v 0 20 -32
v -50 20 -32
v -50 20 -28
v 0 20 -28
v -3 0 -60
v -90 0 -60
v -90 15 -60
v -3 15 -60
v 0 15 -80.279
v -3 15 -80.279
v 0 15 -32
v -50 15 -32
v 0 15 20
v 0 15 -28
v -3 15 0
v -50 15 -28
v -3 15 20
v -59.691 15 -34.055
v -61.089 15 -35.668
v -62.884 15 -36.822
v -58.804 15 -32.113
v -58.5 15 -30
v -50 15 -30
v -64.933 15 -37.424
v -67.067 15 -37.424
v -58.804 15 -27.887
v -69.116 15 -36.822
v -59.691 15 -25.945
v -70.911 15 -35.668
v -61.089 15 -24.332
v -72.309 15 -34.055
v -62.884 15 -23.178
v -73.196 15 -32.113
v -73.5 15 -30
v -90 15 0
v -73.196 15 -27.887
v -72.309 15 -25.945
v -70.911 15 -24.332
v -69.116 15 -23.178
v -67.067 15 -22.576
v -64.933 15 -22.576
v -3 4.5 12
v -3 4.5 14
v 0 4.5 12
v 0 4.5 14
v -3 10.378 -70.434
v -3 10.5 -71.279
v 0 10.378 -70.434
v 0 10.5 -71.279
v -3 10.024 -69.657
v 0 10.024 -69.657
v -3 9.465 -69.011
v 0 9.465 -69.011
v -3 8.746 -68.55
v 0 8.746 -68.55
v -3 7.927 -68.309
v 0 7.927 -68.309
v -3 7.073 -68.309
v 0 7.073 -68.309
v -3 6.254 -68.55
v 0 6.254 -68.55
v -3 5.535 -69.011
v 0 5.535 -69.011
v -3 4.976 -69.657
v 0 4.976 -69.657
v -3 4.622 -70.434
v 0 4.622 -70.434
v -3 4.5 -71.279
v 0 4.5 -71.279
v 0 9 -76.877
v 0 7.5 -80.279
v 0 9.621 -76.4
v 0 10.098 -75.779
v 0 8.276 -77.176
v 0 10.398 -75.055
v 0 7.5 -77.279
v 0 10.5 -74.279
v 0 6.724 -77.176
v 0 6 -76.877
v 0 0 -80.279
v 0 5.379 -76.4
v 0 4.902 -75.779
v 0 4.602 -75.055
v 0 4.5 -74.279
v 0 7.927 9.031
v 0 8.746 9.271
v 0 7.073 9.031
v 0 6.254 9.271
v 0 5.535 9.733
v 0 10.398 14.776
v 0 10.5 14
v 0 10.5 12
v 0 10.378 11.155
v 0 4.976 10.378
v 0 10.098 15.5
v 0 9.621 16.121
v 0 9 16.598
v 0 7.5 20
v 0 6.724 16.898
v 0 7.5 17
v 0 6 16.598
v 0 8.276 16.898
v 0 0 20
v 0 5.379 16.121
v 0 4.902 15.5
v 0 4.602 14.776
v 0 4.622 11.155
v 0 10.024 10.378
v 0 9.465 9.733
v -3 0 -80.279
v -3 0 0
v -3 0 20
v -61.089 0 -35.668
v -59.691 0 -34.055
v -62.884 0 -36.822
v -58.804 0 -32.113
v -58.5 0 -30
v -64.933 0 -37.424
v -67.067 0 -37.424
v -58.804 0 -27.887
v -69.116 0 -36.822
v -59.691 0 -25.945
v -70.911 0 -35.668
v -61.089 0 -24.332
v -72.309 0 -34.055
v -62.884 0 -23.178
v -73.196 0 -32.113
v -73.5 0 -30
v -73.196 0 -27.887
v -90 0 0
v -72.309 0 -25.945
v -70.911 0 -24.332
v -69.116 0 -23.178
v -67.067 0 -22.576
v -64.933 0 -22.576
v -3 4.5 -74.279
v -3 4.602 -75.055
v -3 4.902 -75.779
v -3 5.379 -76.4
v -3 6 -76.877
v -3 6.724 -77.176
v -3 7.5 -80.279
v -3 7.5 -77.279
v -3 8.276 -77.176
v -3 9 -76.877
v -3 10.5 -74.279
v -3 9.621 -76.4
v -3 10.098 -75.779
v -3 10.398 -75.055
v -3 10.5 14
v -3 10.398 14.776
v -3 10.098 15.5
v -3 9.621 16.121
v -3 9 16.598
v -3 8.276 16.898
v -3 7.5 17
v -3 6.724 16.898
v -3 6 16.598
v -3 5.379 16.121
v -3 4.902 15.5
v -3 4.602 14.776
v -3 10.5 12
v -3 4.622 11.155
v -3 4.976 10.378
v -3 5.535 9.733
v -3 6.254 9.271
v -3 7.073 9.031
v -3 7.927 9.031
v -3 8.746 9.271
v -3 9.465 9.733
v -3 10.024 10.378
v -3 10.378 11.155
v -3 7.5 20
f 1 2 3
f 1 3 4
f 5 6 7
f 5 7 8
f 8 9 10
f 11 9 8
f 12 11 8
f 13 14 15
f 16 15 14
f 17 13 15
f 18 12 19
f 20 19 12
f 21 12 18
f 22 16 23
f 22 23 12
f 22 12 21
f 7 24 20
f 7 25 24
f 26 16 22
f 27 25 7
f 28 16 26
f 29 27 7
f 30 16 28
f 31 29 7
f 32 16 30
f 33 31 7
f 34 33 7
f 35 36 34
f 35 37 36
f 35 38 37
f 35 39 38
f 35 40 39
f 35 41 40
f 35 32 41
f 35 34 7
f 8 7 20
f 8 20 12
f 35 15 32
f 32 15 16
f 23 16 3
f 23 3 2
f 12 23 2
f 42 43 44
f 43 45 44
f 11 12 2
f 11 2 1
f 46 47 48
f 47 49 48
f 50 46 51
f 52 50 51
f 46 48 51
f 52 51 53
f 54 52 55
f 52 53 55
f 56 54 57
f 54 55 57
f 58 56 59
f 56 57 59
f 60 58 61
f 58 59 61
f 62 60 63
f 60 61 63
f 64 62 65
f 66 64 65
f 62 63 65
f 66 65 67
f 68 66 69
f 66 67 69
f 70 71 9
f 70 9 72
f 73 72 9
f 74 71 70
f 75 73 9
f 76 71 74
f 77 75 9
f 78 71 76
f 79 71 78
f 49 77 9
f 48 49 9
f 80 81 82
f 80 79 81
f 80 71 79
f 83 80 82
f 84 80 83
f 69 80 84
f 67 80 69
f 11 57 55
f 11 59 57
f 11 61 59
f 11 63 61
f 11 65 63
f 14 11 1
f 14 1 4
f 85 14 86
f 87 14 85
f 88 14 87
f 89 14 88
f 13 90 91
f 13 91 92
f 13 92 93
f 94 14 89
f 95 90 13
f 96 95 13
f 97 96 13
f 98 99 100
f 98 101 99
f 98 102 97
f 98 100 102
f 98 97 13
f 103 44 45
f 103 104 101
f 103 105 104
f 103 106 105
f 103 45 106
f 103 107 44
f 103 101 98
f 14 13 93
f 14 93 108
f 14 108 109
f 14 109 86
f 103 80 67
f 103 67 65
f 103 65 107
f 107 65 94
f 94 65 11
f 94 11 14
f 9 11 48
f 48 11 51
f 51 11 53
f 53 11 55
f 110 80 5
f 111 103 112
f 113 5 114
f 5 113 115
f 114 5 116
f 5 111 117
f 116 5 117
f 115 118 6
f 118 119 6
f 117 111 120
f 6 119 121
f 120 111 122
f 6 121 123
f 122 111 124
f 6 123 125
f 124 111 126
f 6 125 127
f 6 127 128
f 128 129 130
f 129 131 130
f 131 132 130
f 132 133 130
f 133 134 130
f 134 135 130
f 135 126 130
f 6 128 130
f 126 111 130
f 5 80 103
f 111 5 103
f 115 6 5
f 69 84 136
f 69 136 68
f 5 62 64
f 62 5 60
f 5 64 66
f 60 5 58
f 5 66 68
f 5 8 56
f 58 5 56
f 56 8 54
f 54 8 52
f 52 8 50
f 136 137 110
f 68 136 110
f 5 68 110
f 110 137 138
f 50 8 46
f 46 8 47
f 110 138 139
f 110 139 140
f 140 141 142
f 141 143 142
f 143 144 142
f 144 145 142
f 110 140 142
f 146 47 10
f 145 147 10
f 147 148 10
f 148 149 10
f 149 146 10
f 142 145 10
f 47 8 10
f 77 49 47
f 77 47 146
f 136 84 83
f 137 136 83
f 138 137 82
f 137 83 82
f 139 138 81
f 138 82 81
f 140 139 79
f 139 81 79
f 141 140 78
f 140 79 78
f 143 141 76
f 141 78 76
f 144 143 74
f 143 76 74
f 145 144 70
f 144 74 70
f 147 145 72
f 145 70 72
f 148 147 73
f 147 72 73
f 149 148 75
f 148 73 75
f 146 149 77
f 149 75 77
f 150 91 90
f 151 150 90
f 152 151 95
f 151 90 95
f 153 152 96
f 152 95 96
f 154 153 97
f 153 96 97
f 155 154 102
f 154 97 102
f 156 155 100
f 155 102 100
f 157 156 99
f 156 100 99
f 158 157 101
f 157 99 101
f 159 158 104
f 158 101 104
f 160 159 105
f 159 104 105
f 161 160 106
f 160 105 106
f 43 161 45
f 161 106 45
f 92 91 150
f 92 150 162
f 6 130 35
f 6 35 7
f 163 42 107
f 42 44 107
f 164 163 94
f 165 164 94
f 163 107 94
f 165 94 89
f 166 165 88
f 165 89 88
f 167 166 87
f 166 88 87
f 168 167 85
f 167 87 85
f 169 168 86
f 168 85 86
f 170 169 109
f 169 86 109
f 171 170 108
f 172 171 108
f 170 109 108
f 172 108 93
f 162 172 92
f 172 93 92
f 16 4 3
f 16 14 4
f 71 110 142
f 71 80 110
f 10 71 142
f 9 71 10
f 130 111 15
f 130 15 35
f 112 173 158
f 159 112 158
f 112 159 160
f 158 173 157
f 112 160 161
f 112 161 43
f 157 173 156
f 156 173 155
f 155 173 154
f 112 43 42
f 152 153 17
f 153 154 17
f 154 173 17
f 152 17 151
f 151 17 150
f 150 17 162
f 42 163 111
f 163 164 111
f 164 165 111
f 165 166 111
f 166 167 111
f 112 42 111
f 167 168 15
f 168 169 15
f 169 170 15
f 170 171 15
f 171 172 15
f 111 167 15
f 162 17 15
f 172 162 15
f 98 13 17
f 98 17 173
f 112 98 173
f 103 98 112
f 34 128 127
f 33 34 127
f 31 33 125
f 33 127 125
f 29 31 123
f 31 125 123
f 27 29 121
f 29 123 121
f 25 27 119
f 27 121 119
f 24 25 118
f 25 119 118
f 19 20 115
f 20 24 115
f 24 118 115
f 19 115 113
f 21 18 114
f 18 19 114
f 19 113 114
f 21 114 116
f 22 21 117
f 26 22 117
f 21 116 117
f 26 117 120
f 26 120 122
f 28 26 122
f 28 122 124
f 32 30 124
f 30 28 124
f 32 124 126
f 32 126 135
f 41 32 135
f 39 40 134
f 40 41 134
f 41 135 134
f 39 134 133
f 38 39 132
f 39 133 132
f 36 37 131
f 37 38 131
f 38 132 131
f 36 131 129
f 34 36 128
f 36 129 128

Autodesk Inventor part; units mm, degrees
ref_plane "YZ Plane" through (0, 0, 0) normal (1, 0, 0) x (0, 1, 0)
sketch "Эскиз1" plane through (0, 0, 0) normal (0, 1, 0) x (-1, 0, 0)
  line L0 (0, 0) -> (90, 0)
  line L1 (90, 0) -> (90, -60)
  line L2 (90, -60) -> (0, -60)
  line L3 (0, -60) -> (0, 0)
  line L4 (0, -60) -> (66, -60)
  line L5 (0, -30) -> (66, -30)
  circle A0 centre (66, -30) radius 7.5
  dimension "d0" = 90
  dimension "d1" = 60
  dimension "d67" = 66
  dimension "d68" = 15
extrude "Выдавливание1" add sketch "Эскиз1" along normal blind 15
ref_plane "РабПлоскость3" through (0, 15, 0) normal (0, 1, 0) x (1, 0, 0)
sketch "Эскиз3" plane through (0, 15, 0) normal (0, 1, 0) x (1, 0, 0)
  line L0 (0, 0) -> (0, 60) projected
  line L1 (0, 30) -> (0, 28)
  line L2 (0, 28) -> (-50, 28)
  line L3 (-50, 28) -> (-50, 32)
  line L4 (-50, 32) -> (0, 32)
  line L5 (0, 32) -> (0, 28)
  point P0 (0, 32)
  dimension "d13" = 2
  dimension "d14" = 50
  dimension "d15" = 4
extrude "Выдавливание3" add sketch "Эскиз3" along normal blind 5
ref_plane "РабПлоскость1" through (0, 15, 0) normal (0, 1, 0) x (1, 0, 0)
sketch "Эскиз6" plane through (0, 15, 0) normal (0, 1, 0) x (1, 0, 0)
  circle A0 centre (-66, 30) radius 7.5 projected
  line L0 (-66, 30) -> (-66, -120)
  line L1 (-150, -120) -> (0, -120) projected
  line L2 (-66, -120) -> (-66, -100)
  circle A1 centre (-66, -100) radius 10
  circle A2 centre (-66, -100) radius 20
  circle A3 centre (-66, 30) radius 40
  line L3 (-85.7619, -103.0769) -> (-105.5238, 23.8462)
  line L4 (-46.2381, -103.0769) -> (-26.4762, 23.8462)
  line L5 (-66, -100) -> (-66, -40)
  line L6 (-66, -40) -> (-91, -40)
  line L7 (-66, -40) -> (-41, -40)
  circle A4 centre (-91, -40) radius 2.5
  circle A5 centre (-41, -40) radius 2.5
  point P0 (0, 0)
  dimension "d45" = 20
  dimension "d46" = 20
  dimension "d47" = 40
  dimension "d48" = 80
  dimension "d49" = 60
  dimension "d50" = 25
  dimension "d52" = 25
  dimension "d53" = 5
  dimension "d54" = 5
sketch "Эскиз7" plane through (0, 0, 0) normal (1, 0, 0) x (0, 0, -1)
  line L0 (80.2787, 0) -> (80.2787, 15)
  line L1 (60, 15) -> (0, 15) projected
  line L2 (80.2787, 15) -> (60.2787, 15)
  line L3 (60.2787, 15) -> (0, 15)
  line L4 (0, 0) -> (0, 15) projected
  line L5 (0, 15) -> (-20, 15)
  line L6 (-20, 15) -> (-20, 0)
  line L7 (-20, 0) -> (0, 0)
  line L8 (-20, 7.5) -> (-14, 7.5)
  line L9 (80.2787, 7.5) -> (74.2787, 7.5)
  arc A0 (74.2787, 4.5) -> (74.2787, 10.5) centre (74.2787, 7.5) ccw
  arc A1 (-14, 10.5) -> (-14, 4.5) centre (-14, 7.5) ccw
  line L10 (60, 0) -> (0, 0) projected
  line L11 (60, 0) -> (0, 0)
  line L12 (60, 0) -> (60, 15) projected
  line L13 (60, 0) -> (60, 15)
  line L14 (60, 0) -> (80.2787, 0)
  line L15 (74.2787, 4.5) -> (71.2787, 4.5)
  line L16 (71.2787, 10.5) -> (74.2787, 10.5)
  arc A2 (71.2787, 10.5) -> (71.2787, 4.5) centre (71.2787, 7.5) ccw
  line L17 (-14, 7.5) -> (-12, 7.5)
  arc A3 (-12, 4.5) -> (-12, 10.5) centre (-12, 7.5) ccw
  line L18 (-14, 7.5) -> (-14, 10.5)
  line L19 (-14, 10.5) -> (-12, 10.5)
  line L20 (-14, 4.5) -> (-12, 4.5)
  point P0 (-17, 7.5)
  dimension "d59" = 20
  dimension "d60" = 6
  dimension "d61" = 6
  dimension "d62" = 6
  dimension "d63" = 6
extrude "Выдавливание7" add sketch "Эскиз7" against normal blind 3
properties part number "Стенка энкодера штурвала"
